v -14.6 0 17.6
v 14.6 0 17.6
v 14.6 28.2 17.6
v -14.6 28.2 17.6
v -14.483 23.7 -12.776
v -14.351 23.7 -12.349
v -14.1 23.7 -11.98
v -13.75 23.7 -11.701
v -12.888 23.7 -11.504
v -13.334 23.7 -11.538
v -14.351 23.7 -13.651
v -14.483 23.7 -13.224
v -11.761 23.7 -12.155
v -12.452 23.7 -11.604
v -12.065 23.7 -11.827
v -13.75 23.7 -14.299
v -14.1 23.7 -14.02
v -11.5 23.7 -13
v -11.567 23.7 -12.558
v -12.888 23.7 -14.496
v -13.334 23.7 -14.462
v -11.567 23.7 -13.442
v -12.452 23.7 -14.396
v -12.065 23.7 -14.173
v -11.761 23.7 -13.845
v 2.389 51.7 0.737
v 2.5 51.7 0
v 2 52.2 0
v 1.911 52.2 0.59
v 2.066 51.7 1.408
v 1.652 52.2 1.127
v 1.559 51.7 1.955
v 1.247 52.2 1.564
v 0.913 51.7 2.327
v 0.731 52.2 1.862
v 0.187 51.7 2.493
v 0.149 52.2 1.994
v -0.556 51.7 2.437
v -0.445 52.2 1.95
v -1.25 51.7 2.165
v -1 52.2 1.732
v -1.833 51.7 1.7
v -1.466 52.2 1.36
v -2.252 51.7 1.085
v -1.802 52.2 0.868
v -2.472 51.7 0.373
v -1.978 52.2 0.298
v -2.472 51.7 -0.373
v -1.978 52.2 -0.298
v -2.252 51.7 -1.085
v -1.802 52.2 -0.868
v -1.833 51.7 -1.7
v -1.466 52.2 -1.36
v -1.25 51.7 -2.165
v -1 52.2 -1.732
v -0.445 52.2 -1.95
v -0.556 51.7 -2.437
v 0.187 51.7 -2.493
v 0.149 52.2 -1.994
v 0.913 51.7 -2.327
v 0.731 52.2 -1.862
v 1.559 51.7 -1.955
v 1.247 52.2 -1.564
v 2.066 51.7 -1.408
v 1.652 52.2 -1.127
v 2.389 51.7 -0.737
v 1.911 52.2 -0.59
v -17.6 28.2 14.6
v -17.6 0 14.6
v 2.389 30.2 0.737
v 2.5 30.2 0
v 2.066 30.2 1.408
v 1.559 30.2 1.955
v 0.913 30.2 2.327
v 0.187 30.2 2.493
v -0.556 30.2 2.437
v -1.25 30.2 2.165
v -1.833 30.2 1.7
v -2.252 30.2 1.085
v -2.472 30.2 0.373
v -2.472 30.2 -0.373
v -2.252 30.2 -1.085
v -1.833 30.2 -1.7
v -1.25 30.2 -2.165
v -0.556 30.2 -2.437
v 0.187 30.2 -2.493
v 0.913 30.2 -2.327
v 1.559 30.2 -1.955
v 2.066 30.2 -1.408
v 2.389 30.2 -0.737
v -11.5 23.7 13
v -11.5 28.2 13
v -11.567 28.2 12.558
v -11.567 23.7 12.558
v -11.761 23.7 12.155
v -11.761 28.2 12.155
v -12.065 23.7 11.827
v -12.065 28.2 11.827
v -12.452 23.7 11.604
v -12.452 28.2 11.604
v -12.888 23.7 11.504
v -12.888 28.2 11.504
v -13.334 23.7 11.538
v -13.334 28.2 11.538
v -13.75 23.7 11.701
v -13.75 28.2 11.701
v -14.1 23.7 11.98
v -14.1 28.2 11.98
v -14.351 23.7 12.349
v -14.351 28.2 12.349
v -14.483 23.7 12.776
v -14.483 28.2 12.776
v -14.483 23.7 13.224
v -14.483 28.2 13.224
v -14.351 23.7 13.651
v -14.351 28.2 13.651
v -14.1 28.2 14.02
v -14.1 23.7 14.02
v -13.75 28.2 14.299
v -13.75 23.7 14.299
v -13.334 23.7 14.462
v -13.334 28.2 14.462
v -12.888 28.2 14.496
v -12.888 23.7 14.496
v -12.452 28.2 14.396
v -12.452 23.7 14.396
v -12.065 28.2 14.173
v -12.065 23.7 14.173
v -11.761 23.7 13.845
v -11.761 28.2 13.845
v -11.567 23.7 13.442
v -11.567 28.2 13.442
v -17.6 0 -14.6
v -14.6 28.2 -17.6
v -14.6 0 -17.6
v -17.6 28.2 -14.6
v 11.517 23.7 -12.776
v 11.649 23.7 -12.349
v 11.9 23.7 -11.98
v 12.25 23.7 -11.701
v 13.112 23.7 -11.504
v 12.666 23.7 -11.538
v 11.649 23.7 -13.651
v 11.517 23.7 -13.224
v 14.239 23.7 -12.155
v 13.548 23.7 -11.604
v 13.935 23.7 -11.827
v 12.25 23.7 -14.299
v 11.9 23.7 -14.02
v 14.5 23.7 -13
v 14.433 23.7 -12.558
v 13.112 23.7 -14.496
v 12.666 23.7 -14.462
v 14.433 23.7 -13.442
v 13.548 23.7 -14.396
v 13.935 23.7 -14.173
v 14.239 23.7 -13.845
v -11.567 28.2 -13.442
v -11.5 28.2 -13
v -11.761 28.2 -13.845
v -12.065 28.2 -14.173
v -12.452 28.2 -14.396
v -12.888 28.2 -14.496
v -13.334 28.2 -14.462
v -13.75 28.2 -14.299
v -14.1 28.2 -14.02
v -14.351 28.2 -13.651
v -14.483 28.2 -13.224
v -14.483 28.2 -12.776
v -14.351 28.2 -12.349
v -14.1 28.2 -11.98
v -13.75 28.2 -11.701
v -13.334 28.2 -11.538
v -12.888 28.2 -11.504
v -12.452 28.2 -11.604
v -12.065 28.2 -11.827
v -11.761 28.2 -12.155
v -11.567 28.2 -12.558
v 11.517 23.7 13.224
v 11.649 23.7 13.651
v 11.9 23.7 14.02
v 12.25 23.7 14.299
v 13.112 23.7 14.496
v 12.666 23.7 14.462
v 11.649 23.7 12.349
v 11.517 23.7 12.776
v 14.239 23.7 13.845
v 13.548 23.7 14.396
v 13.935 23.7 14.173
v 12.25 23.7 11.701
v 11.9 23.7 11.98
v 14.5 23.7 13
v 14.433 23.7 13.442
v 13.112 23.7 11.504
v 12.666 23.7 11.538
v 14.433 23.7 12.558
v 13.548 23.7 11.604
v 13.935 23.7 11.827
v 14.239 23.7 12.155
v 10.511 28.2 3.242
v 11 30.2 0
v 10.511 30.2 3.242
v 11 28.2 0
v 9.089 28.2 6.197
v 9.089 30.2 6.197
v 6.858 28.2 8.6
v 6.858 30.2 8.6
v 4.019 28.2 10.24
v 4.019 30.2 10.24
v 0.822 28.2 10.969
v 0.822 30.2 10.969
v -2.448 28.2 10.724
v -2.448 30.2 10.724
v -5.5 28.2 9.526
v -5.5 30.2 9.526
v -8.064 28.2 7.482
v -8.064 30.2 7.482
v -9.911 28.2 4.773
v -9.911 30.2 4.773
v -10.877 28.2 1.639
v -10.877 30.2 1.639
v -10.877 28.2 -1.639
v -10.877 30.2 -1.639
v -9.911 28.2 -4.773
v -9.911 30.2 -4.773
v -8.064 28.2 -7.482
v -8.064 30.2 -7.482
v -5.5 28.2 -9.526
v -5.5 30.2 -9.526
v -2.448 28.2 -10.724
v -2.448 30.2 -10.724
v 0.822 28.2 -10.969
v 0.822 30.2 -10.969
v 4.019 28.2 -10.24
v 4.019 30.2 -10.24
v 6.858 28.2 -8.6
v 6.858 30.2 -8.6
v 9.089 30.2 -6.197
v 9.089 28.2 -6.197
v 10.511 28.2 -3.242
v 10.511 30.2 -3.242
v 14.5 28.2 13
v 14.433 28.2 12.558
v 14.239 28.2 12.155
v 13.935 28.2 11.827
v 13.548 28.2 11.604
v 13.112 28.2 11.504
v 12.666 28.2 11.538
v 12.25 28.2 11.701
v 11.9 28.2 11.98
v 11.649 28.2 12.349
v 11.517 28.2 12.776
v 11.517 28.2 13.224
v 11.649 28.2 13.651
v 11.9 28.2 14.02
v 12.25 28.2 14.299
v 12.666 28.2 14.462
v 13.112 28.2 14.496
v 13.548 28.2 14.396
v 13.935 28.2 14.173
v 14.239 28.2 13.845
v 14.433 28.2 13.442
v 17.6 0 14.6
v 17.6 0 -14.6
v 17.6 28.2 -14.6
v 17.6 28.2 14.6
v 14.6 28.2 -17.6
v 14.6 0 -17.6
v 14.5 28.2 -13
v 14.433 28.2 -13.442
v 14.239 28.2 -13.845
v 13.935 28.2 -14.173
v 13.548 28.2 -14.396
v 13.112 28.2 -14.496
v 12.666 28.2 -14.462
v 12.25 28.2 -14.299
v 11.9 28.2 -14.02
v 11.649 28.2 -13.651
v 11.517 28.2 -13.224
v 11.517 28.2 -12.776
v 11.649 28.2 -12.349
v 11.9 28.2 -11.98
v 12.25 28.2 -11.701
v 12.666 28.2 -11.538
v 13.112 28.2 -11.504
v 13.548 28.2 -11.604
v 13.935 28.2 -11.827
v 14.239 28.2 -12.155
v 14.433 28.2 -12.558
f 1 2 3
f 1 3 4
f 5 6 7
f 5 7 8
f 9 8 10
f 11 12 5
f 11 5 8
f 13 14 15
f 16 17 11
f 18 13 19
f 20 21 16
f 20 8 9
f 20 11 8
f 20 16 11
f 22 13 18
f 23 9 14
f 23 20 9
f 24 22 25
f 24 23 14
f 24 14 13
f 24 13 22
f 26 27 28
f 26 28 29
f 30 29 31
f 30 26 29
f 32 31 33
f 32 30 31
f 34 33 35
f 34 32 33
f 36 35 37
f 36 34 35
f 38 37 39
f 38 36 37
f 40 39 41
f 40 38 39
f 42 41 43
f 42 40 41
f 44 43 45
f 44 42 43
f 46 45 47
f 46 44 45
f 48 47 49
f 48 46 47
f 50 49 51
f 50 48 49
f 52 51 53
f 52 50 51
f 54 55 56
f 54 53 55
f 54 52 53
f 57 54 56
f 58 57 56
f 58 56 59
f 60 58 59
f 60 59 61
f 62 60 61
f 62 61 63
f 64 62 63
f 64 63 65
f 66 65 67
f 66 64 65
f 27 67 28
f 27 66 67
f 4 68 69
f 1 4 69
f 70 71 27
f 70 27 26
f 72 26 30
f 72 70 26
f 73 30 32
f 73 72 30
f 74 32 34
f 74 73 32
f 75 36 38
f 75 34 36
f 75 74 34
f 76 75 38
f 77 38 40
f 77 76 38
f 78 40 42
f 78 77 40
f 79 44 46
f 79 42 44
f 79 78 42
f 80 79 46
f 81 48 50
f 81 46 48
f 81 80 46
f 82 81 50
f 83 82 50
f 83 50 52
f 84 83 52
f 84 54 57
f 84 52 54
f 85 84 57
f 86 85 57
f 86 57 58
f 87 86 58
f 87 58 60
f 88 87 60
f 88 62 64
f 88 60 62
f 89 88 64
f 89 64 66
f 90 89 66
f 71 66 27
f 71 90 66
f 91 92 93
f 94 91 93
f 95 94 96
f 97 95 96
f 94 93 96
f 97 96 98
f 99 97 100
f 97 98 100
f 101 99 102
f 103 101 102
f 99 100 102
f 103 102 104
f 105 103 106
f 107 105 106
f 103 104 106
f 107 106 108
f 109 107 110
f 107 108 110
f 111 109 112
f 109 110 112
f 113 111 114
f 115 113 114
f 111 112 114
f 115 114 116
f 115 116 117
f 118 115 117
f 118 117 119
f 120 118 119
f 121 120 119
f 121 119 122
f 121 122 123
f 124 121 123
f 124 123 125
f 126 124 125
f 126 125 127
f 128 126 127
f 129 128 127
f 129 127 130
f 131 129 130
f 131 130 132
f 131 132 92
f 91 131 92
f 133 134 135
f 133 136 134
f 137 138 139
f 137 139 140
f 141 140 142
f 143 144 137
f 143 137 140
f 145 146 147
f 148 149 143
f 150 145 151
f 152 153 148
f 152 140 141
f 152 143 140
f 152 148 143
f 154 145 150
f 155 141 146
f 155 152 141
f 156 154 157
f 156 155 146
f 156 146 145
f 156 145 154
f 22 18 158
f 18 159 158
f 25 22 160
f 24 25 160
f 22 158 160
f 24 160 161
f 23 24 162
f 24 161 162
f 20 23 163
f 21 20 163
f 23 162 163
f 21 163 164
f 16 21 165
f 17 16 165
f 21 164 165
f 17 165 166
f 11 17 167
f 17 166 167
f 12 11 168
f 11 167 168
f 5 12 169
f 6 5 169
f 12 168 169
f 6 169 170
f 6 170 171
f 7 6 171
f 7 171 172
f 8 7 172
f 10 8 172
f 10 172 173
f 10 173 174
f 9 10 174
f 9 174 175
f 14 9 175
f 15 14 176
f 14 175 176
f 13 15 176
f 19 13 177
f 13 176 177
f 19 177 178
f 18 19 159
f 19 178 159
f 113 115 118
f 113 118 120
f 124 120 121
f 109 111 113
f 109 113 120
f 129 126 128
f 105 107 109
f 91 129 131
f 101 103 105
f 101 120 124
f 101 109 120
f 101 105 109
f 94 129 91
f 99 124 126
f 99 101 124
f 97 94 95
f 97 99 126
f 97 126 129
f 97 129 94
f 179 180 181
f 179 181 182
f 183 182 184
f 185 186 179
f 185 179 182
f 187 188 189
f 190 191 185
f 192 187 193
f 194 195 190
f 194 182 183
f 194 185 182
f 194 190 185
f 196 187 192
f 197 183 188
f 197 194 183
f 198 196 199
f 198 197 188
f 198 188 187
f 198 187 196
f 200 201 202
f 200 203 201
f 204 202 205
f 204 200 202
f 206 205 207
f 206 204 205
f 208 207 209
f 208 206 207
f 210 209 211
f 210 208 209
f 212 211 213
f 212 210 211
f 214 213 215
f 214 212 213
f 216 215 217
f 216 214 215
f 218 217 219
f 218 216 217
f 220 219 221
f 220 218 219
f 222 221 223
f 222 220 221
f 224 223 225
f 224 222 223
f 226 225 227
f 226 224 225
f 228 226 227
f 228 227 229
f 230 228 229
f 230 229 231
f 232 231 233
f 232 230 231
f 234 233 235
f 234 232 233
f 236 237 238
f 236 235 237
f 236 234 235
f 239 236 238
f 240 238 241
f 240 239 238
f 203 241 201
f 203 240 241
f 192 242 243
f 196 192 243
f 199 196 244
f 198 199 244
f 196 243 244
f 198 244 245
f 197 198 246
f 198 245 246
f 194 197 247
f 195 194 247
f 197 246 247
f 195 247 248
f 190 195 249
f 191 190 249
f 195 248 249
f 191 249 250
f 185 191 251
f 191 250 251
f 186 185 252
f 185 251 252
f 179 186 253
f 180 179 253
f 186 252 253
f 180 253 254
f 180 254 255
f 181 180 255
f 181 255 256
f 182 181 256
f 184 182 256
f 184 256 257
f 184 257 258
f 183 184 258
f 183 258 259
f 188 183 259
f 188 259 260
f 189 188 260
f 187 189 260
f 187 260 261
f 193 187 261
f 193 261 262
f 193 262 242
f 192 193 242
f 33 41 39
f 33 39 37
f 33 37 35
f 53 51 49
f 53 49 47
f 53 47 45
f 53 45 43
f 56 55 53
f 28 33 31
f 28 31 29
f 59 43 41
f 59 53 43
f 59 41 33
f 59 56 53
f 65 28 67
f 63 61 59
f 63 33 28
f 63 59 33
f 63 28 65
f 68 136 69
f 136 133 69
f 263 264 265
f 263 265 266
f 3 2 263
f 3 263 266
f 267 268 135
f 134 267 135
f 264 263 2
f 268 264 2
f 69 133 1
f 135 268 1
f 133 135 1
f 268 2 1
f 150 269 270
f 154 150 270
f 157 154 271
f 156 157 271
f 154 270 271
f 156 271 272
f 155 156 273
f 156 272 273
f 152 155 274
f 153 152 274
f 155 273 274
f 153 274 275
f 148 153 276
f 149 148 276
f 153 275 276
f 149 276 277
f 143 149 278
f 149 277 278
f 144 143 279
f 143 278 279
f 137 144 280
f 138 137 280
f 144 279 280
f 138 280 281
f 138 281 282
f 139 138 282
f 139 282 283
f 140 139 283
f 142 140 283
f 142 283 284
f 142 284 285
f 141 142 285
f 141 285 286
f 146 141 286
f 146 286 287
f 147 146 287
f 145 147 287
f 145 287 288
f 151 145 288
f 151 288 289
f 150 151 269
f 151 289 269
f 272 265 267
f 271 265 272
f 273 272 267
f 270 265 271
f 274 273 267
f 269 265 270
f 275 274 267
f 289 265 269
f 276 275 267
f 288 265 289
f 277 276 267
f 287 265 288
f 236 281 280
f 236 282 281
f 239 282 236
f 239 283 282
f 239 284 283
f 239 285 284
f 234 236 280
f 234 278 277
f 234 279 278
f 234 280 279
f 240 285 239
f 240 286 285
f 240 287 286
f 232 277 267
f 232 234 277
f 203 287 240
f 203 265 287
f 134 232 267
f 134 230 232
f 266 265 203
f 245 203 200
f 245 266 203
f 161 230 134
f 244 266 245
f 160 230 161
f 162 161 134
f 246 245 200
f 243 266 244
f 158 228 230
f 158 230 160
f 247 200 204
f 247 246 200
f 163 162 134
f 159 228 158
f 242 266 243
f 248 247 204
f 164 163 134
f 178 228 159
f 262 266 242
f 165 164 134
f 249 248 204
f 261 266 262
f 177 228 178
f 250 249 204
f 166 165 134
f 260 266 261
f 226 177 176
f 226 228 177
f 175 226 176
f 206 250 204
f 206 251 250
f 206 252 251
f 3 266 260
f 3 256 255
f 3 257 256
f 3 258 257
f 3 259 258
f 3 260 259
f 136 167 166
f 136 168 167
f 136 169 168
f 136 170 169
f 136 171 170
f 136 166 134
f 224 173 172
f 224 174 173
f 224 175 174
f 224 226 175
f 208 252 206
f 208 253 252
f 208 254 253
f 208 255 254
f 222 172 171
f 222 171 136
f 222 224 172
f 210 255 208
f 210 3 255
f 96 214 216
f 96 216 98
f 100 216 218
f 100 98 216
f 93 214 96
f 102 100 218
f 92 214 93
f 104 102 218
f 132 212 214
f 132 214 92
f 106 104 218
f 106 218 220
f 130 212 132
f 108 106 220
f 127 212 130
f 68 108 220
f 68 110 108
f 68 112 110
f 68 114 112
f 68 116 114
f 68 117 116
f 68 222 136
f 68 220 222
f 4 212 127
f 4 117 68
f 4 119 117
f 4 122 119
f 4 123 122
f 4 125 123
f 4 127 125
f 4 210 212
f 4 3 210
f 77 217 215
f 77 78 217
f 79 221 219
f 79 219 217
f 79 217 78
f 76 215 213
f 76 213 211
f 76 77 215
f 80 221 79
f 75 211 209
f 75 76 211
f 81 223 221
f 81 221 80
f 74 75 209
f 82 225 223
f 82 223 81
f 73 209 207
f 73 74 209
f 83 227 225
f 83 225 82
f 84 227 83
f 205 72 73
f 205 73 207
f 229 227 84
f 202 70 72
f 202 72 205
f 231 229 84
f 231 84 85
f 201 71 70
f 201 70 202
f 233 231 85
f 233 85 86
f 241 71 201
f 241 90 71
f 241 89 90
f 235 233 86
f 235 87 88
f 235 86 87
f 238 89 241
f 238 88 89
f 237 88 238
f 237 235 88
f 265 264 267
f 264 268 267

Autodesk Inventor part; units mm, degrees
ref_plane "YZ Plane" through (0, 0, 0) normal (1, 0, 0) x (0, 1, 0)
ref_plane "XZ Plane" through (0, 0, 0) normal (0, 1, 0) x (-1, 0, 0)
ref_plane "XY Plane" through (0, 0, 0) normal (0, 0, 1) x (1, 0, 0)
sketch "Sketch1" plane through (0, 0, 0) normal (0, 1, 0) x (-1, 0, 0)
  line L0 (-17.6, 0) -> (-17.6, -17.6)
  line L1 (-17.6, -17.6) -> (0, -17.6)
  line L2 (17.6, 0) -> (17.6, -17.6)
  line L3 (17.6, -17.6) -> (0, -17.6)
  line L4 (-17.6, 0) -> (-17.6, 17.6)
  line L5 (-17.6, 17.6) -> (0, 17.6)
  line L6 (17.6, 17.6) -> (0, 17.6)
  line L7 (17.6, 0) -> (17.6, 17.6)
  point P0 (0, 0)
  dimension "d0" = 17.6
  dimension "d1" = 17.6
extrude "Extrusion1" add sketch "Sketch1" along normal blind 28.2
sketch "Sketch2" plane through (0, 28.2, 0) normal (0, 1, 0) x (1, 0, 0)
  circle A0 centre (13, 13) radius 1.5
  circle A1 centre (-13, 13) radius 1.5
  circle A2 centre (13, -13) radius 1.5
  circle A3 centre (-13, -13) radius 1.5
  point P0 (0, 0)
  dimension "d4" = 3
  dimension "d5" = 3
  dimension "d6" = 3
  dimension "d7" = 3
extrude "Extrusion2" cut sketch "Sketch2" against normal blind 4.5
chamfer "Chamfer1" distance 3 angle 45 4 edges at (17.6, 14.1, 17.6) (17.6, 14.1, -17.6) (-17.6, 14.1, 17.6) (-17.6, 14.1, -17.6)
sketch "Sketch3" plane through (0, 28.2, 0) normal (0, 1, 0) x (1, 0, 0)
  circle A0 centre (0, 0) radius 11
  dimension "d13" = 22
extrude "Extrusion3" add sketch "Sketch3" along normal blind 2
sketch "Sketch4" plane through (0, 30.2, 0) normal (0, 1, 0) x (1, 0, 0)
  circle A0 centre (0, 0) radius 2.5
  dimension "d16" = 5
extrude "Extrusion4" add sketch "Sketch4" along normal blind 22
chamfer "Chamfer2" distance 0.5 angle 45 1 edges at (-2.5, 52.2, 0)
properties part number "14HM11"
